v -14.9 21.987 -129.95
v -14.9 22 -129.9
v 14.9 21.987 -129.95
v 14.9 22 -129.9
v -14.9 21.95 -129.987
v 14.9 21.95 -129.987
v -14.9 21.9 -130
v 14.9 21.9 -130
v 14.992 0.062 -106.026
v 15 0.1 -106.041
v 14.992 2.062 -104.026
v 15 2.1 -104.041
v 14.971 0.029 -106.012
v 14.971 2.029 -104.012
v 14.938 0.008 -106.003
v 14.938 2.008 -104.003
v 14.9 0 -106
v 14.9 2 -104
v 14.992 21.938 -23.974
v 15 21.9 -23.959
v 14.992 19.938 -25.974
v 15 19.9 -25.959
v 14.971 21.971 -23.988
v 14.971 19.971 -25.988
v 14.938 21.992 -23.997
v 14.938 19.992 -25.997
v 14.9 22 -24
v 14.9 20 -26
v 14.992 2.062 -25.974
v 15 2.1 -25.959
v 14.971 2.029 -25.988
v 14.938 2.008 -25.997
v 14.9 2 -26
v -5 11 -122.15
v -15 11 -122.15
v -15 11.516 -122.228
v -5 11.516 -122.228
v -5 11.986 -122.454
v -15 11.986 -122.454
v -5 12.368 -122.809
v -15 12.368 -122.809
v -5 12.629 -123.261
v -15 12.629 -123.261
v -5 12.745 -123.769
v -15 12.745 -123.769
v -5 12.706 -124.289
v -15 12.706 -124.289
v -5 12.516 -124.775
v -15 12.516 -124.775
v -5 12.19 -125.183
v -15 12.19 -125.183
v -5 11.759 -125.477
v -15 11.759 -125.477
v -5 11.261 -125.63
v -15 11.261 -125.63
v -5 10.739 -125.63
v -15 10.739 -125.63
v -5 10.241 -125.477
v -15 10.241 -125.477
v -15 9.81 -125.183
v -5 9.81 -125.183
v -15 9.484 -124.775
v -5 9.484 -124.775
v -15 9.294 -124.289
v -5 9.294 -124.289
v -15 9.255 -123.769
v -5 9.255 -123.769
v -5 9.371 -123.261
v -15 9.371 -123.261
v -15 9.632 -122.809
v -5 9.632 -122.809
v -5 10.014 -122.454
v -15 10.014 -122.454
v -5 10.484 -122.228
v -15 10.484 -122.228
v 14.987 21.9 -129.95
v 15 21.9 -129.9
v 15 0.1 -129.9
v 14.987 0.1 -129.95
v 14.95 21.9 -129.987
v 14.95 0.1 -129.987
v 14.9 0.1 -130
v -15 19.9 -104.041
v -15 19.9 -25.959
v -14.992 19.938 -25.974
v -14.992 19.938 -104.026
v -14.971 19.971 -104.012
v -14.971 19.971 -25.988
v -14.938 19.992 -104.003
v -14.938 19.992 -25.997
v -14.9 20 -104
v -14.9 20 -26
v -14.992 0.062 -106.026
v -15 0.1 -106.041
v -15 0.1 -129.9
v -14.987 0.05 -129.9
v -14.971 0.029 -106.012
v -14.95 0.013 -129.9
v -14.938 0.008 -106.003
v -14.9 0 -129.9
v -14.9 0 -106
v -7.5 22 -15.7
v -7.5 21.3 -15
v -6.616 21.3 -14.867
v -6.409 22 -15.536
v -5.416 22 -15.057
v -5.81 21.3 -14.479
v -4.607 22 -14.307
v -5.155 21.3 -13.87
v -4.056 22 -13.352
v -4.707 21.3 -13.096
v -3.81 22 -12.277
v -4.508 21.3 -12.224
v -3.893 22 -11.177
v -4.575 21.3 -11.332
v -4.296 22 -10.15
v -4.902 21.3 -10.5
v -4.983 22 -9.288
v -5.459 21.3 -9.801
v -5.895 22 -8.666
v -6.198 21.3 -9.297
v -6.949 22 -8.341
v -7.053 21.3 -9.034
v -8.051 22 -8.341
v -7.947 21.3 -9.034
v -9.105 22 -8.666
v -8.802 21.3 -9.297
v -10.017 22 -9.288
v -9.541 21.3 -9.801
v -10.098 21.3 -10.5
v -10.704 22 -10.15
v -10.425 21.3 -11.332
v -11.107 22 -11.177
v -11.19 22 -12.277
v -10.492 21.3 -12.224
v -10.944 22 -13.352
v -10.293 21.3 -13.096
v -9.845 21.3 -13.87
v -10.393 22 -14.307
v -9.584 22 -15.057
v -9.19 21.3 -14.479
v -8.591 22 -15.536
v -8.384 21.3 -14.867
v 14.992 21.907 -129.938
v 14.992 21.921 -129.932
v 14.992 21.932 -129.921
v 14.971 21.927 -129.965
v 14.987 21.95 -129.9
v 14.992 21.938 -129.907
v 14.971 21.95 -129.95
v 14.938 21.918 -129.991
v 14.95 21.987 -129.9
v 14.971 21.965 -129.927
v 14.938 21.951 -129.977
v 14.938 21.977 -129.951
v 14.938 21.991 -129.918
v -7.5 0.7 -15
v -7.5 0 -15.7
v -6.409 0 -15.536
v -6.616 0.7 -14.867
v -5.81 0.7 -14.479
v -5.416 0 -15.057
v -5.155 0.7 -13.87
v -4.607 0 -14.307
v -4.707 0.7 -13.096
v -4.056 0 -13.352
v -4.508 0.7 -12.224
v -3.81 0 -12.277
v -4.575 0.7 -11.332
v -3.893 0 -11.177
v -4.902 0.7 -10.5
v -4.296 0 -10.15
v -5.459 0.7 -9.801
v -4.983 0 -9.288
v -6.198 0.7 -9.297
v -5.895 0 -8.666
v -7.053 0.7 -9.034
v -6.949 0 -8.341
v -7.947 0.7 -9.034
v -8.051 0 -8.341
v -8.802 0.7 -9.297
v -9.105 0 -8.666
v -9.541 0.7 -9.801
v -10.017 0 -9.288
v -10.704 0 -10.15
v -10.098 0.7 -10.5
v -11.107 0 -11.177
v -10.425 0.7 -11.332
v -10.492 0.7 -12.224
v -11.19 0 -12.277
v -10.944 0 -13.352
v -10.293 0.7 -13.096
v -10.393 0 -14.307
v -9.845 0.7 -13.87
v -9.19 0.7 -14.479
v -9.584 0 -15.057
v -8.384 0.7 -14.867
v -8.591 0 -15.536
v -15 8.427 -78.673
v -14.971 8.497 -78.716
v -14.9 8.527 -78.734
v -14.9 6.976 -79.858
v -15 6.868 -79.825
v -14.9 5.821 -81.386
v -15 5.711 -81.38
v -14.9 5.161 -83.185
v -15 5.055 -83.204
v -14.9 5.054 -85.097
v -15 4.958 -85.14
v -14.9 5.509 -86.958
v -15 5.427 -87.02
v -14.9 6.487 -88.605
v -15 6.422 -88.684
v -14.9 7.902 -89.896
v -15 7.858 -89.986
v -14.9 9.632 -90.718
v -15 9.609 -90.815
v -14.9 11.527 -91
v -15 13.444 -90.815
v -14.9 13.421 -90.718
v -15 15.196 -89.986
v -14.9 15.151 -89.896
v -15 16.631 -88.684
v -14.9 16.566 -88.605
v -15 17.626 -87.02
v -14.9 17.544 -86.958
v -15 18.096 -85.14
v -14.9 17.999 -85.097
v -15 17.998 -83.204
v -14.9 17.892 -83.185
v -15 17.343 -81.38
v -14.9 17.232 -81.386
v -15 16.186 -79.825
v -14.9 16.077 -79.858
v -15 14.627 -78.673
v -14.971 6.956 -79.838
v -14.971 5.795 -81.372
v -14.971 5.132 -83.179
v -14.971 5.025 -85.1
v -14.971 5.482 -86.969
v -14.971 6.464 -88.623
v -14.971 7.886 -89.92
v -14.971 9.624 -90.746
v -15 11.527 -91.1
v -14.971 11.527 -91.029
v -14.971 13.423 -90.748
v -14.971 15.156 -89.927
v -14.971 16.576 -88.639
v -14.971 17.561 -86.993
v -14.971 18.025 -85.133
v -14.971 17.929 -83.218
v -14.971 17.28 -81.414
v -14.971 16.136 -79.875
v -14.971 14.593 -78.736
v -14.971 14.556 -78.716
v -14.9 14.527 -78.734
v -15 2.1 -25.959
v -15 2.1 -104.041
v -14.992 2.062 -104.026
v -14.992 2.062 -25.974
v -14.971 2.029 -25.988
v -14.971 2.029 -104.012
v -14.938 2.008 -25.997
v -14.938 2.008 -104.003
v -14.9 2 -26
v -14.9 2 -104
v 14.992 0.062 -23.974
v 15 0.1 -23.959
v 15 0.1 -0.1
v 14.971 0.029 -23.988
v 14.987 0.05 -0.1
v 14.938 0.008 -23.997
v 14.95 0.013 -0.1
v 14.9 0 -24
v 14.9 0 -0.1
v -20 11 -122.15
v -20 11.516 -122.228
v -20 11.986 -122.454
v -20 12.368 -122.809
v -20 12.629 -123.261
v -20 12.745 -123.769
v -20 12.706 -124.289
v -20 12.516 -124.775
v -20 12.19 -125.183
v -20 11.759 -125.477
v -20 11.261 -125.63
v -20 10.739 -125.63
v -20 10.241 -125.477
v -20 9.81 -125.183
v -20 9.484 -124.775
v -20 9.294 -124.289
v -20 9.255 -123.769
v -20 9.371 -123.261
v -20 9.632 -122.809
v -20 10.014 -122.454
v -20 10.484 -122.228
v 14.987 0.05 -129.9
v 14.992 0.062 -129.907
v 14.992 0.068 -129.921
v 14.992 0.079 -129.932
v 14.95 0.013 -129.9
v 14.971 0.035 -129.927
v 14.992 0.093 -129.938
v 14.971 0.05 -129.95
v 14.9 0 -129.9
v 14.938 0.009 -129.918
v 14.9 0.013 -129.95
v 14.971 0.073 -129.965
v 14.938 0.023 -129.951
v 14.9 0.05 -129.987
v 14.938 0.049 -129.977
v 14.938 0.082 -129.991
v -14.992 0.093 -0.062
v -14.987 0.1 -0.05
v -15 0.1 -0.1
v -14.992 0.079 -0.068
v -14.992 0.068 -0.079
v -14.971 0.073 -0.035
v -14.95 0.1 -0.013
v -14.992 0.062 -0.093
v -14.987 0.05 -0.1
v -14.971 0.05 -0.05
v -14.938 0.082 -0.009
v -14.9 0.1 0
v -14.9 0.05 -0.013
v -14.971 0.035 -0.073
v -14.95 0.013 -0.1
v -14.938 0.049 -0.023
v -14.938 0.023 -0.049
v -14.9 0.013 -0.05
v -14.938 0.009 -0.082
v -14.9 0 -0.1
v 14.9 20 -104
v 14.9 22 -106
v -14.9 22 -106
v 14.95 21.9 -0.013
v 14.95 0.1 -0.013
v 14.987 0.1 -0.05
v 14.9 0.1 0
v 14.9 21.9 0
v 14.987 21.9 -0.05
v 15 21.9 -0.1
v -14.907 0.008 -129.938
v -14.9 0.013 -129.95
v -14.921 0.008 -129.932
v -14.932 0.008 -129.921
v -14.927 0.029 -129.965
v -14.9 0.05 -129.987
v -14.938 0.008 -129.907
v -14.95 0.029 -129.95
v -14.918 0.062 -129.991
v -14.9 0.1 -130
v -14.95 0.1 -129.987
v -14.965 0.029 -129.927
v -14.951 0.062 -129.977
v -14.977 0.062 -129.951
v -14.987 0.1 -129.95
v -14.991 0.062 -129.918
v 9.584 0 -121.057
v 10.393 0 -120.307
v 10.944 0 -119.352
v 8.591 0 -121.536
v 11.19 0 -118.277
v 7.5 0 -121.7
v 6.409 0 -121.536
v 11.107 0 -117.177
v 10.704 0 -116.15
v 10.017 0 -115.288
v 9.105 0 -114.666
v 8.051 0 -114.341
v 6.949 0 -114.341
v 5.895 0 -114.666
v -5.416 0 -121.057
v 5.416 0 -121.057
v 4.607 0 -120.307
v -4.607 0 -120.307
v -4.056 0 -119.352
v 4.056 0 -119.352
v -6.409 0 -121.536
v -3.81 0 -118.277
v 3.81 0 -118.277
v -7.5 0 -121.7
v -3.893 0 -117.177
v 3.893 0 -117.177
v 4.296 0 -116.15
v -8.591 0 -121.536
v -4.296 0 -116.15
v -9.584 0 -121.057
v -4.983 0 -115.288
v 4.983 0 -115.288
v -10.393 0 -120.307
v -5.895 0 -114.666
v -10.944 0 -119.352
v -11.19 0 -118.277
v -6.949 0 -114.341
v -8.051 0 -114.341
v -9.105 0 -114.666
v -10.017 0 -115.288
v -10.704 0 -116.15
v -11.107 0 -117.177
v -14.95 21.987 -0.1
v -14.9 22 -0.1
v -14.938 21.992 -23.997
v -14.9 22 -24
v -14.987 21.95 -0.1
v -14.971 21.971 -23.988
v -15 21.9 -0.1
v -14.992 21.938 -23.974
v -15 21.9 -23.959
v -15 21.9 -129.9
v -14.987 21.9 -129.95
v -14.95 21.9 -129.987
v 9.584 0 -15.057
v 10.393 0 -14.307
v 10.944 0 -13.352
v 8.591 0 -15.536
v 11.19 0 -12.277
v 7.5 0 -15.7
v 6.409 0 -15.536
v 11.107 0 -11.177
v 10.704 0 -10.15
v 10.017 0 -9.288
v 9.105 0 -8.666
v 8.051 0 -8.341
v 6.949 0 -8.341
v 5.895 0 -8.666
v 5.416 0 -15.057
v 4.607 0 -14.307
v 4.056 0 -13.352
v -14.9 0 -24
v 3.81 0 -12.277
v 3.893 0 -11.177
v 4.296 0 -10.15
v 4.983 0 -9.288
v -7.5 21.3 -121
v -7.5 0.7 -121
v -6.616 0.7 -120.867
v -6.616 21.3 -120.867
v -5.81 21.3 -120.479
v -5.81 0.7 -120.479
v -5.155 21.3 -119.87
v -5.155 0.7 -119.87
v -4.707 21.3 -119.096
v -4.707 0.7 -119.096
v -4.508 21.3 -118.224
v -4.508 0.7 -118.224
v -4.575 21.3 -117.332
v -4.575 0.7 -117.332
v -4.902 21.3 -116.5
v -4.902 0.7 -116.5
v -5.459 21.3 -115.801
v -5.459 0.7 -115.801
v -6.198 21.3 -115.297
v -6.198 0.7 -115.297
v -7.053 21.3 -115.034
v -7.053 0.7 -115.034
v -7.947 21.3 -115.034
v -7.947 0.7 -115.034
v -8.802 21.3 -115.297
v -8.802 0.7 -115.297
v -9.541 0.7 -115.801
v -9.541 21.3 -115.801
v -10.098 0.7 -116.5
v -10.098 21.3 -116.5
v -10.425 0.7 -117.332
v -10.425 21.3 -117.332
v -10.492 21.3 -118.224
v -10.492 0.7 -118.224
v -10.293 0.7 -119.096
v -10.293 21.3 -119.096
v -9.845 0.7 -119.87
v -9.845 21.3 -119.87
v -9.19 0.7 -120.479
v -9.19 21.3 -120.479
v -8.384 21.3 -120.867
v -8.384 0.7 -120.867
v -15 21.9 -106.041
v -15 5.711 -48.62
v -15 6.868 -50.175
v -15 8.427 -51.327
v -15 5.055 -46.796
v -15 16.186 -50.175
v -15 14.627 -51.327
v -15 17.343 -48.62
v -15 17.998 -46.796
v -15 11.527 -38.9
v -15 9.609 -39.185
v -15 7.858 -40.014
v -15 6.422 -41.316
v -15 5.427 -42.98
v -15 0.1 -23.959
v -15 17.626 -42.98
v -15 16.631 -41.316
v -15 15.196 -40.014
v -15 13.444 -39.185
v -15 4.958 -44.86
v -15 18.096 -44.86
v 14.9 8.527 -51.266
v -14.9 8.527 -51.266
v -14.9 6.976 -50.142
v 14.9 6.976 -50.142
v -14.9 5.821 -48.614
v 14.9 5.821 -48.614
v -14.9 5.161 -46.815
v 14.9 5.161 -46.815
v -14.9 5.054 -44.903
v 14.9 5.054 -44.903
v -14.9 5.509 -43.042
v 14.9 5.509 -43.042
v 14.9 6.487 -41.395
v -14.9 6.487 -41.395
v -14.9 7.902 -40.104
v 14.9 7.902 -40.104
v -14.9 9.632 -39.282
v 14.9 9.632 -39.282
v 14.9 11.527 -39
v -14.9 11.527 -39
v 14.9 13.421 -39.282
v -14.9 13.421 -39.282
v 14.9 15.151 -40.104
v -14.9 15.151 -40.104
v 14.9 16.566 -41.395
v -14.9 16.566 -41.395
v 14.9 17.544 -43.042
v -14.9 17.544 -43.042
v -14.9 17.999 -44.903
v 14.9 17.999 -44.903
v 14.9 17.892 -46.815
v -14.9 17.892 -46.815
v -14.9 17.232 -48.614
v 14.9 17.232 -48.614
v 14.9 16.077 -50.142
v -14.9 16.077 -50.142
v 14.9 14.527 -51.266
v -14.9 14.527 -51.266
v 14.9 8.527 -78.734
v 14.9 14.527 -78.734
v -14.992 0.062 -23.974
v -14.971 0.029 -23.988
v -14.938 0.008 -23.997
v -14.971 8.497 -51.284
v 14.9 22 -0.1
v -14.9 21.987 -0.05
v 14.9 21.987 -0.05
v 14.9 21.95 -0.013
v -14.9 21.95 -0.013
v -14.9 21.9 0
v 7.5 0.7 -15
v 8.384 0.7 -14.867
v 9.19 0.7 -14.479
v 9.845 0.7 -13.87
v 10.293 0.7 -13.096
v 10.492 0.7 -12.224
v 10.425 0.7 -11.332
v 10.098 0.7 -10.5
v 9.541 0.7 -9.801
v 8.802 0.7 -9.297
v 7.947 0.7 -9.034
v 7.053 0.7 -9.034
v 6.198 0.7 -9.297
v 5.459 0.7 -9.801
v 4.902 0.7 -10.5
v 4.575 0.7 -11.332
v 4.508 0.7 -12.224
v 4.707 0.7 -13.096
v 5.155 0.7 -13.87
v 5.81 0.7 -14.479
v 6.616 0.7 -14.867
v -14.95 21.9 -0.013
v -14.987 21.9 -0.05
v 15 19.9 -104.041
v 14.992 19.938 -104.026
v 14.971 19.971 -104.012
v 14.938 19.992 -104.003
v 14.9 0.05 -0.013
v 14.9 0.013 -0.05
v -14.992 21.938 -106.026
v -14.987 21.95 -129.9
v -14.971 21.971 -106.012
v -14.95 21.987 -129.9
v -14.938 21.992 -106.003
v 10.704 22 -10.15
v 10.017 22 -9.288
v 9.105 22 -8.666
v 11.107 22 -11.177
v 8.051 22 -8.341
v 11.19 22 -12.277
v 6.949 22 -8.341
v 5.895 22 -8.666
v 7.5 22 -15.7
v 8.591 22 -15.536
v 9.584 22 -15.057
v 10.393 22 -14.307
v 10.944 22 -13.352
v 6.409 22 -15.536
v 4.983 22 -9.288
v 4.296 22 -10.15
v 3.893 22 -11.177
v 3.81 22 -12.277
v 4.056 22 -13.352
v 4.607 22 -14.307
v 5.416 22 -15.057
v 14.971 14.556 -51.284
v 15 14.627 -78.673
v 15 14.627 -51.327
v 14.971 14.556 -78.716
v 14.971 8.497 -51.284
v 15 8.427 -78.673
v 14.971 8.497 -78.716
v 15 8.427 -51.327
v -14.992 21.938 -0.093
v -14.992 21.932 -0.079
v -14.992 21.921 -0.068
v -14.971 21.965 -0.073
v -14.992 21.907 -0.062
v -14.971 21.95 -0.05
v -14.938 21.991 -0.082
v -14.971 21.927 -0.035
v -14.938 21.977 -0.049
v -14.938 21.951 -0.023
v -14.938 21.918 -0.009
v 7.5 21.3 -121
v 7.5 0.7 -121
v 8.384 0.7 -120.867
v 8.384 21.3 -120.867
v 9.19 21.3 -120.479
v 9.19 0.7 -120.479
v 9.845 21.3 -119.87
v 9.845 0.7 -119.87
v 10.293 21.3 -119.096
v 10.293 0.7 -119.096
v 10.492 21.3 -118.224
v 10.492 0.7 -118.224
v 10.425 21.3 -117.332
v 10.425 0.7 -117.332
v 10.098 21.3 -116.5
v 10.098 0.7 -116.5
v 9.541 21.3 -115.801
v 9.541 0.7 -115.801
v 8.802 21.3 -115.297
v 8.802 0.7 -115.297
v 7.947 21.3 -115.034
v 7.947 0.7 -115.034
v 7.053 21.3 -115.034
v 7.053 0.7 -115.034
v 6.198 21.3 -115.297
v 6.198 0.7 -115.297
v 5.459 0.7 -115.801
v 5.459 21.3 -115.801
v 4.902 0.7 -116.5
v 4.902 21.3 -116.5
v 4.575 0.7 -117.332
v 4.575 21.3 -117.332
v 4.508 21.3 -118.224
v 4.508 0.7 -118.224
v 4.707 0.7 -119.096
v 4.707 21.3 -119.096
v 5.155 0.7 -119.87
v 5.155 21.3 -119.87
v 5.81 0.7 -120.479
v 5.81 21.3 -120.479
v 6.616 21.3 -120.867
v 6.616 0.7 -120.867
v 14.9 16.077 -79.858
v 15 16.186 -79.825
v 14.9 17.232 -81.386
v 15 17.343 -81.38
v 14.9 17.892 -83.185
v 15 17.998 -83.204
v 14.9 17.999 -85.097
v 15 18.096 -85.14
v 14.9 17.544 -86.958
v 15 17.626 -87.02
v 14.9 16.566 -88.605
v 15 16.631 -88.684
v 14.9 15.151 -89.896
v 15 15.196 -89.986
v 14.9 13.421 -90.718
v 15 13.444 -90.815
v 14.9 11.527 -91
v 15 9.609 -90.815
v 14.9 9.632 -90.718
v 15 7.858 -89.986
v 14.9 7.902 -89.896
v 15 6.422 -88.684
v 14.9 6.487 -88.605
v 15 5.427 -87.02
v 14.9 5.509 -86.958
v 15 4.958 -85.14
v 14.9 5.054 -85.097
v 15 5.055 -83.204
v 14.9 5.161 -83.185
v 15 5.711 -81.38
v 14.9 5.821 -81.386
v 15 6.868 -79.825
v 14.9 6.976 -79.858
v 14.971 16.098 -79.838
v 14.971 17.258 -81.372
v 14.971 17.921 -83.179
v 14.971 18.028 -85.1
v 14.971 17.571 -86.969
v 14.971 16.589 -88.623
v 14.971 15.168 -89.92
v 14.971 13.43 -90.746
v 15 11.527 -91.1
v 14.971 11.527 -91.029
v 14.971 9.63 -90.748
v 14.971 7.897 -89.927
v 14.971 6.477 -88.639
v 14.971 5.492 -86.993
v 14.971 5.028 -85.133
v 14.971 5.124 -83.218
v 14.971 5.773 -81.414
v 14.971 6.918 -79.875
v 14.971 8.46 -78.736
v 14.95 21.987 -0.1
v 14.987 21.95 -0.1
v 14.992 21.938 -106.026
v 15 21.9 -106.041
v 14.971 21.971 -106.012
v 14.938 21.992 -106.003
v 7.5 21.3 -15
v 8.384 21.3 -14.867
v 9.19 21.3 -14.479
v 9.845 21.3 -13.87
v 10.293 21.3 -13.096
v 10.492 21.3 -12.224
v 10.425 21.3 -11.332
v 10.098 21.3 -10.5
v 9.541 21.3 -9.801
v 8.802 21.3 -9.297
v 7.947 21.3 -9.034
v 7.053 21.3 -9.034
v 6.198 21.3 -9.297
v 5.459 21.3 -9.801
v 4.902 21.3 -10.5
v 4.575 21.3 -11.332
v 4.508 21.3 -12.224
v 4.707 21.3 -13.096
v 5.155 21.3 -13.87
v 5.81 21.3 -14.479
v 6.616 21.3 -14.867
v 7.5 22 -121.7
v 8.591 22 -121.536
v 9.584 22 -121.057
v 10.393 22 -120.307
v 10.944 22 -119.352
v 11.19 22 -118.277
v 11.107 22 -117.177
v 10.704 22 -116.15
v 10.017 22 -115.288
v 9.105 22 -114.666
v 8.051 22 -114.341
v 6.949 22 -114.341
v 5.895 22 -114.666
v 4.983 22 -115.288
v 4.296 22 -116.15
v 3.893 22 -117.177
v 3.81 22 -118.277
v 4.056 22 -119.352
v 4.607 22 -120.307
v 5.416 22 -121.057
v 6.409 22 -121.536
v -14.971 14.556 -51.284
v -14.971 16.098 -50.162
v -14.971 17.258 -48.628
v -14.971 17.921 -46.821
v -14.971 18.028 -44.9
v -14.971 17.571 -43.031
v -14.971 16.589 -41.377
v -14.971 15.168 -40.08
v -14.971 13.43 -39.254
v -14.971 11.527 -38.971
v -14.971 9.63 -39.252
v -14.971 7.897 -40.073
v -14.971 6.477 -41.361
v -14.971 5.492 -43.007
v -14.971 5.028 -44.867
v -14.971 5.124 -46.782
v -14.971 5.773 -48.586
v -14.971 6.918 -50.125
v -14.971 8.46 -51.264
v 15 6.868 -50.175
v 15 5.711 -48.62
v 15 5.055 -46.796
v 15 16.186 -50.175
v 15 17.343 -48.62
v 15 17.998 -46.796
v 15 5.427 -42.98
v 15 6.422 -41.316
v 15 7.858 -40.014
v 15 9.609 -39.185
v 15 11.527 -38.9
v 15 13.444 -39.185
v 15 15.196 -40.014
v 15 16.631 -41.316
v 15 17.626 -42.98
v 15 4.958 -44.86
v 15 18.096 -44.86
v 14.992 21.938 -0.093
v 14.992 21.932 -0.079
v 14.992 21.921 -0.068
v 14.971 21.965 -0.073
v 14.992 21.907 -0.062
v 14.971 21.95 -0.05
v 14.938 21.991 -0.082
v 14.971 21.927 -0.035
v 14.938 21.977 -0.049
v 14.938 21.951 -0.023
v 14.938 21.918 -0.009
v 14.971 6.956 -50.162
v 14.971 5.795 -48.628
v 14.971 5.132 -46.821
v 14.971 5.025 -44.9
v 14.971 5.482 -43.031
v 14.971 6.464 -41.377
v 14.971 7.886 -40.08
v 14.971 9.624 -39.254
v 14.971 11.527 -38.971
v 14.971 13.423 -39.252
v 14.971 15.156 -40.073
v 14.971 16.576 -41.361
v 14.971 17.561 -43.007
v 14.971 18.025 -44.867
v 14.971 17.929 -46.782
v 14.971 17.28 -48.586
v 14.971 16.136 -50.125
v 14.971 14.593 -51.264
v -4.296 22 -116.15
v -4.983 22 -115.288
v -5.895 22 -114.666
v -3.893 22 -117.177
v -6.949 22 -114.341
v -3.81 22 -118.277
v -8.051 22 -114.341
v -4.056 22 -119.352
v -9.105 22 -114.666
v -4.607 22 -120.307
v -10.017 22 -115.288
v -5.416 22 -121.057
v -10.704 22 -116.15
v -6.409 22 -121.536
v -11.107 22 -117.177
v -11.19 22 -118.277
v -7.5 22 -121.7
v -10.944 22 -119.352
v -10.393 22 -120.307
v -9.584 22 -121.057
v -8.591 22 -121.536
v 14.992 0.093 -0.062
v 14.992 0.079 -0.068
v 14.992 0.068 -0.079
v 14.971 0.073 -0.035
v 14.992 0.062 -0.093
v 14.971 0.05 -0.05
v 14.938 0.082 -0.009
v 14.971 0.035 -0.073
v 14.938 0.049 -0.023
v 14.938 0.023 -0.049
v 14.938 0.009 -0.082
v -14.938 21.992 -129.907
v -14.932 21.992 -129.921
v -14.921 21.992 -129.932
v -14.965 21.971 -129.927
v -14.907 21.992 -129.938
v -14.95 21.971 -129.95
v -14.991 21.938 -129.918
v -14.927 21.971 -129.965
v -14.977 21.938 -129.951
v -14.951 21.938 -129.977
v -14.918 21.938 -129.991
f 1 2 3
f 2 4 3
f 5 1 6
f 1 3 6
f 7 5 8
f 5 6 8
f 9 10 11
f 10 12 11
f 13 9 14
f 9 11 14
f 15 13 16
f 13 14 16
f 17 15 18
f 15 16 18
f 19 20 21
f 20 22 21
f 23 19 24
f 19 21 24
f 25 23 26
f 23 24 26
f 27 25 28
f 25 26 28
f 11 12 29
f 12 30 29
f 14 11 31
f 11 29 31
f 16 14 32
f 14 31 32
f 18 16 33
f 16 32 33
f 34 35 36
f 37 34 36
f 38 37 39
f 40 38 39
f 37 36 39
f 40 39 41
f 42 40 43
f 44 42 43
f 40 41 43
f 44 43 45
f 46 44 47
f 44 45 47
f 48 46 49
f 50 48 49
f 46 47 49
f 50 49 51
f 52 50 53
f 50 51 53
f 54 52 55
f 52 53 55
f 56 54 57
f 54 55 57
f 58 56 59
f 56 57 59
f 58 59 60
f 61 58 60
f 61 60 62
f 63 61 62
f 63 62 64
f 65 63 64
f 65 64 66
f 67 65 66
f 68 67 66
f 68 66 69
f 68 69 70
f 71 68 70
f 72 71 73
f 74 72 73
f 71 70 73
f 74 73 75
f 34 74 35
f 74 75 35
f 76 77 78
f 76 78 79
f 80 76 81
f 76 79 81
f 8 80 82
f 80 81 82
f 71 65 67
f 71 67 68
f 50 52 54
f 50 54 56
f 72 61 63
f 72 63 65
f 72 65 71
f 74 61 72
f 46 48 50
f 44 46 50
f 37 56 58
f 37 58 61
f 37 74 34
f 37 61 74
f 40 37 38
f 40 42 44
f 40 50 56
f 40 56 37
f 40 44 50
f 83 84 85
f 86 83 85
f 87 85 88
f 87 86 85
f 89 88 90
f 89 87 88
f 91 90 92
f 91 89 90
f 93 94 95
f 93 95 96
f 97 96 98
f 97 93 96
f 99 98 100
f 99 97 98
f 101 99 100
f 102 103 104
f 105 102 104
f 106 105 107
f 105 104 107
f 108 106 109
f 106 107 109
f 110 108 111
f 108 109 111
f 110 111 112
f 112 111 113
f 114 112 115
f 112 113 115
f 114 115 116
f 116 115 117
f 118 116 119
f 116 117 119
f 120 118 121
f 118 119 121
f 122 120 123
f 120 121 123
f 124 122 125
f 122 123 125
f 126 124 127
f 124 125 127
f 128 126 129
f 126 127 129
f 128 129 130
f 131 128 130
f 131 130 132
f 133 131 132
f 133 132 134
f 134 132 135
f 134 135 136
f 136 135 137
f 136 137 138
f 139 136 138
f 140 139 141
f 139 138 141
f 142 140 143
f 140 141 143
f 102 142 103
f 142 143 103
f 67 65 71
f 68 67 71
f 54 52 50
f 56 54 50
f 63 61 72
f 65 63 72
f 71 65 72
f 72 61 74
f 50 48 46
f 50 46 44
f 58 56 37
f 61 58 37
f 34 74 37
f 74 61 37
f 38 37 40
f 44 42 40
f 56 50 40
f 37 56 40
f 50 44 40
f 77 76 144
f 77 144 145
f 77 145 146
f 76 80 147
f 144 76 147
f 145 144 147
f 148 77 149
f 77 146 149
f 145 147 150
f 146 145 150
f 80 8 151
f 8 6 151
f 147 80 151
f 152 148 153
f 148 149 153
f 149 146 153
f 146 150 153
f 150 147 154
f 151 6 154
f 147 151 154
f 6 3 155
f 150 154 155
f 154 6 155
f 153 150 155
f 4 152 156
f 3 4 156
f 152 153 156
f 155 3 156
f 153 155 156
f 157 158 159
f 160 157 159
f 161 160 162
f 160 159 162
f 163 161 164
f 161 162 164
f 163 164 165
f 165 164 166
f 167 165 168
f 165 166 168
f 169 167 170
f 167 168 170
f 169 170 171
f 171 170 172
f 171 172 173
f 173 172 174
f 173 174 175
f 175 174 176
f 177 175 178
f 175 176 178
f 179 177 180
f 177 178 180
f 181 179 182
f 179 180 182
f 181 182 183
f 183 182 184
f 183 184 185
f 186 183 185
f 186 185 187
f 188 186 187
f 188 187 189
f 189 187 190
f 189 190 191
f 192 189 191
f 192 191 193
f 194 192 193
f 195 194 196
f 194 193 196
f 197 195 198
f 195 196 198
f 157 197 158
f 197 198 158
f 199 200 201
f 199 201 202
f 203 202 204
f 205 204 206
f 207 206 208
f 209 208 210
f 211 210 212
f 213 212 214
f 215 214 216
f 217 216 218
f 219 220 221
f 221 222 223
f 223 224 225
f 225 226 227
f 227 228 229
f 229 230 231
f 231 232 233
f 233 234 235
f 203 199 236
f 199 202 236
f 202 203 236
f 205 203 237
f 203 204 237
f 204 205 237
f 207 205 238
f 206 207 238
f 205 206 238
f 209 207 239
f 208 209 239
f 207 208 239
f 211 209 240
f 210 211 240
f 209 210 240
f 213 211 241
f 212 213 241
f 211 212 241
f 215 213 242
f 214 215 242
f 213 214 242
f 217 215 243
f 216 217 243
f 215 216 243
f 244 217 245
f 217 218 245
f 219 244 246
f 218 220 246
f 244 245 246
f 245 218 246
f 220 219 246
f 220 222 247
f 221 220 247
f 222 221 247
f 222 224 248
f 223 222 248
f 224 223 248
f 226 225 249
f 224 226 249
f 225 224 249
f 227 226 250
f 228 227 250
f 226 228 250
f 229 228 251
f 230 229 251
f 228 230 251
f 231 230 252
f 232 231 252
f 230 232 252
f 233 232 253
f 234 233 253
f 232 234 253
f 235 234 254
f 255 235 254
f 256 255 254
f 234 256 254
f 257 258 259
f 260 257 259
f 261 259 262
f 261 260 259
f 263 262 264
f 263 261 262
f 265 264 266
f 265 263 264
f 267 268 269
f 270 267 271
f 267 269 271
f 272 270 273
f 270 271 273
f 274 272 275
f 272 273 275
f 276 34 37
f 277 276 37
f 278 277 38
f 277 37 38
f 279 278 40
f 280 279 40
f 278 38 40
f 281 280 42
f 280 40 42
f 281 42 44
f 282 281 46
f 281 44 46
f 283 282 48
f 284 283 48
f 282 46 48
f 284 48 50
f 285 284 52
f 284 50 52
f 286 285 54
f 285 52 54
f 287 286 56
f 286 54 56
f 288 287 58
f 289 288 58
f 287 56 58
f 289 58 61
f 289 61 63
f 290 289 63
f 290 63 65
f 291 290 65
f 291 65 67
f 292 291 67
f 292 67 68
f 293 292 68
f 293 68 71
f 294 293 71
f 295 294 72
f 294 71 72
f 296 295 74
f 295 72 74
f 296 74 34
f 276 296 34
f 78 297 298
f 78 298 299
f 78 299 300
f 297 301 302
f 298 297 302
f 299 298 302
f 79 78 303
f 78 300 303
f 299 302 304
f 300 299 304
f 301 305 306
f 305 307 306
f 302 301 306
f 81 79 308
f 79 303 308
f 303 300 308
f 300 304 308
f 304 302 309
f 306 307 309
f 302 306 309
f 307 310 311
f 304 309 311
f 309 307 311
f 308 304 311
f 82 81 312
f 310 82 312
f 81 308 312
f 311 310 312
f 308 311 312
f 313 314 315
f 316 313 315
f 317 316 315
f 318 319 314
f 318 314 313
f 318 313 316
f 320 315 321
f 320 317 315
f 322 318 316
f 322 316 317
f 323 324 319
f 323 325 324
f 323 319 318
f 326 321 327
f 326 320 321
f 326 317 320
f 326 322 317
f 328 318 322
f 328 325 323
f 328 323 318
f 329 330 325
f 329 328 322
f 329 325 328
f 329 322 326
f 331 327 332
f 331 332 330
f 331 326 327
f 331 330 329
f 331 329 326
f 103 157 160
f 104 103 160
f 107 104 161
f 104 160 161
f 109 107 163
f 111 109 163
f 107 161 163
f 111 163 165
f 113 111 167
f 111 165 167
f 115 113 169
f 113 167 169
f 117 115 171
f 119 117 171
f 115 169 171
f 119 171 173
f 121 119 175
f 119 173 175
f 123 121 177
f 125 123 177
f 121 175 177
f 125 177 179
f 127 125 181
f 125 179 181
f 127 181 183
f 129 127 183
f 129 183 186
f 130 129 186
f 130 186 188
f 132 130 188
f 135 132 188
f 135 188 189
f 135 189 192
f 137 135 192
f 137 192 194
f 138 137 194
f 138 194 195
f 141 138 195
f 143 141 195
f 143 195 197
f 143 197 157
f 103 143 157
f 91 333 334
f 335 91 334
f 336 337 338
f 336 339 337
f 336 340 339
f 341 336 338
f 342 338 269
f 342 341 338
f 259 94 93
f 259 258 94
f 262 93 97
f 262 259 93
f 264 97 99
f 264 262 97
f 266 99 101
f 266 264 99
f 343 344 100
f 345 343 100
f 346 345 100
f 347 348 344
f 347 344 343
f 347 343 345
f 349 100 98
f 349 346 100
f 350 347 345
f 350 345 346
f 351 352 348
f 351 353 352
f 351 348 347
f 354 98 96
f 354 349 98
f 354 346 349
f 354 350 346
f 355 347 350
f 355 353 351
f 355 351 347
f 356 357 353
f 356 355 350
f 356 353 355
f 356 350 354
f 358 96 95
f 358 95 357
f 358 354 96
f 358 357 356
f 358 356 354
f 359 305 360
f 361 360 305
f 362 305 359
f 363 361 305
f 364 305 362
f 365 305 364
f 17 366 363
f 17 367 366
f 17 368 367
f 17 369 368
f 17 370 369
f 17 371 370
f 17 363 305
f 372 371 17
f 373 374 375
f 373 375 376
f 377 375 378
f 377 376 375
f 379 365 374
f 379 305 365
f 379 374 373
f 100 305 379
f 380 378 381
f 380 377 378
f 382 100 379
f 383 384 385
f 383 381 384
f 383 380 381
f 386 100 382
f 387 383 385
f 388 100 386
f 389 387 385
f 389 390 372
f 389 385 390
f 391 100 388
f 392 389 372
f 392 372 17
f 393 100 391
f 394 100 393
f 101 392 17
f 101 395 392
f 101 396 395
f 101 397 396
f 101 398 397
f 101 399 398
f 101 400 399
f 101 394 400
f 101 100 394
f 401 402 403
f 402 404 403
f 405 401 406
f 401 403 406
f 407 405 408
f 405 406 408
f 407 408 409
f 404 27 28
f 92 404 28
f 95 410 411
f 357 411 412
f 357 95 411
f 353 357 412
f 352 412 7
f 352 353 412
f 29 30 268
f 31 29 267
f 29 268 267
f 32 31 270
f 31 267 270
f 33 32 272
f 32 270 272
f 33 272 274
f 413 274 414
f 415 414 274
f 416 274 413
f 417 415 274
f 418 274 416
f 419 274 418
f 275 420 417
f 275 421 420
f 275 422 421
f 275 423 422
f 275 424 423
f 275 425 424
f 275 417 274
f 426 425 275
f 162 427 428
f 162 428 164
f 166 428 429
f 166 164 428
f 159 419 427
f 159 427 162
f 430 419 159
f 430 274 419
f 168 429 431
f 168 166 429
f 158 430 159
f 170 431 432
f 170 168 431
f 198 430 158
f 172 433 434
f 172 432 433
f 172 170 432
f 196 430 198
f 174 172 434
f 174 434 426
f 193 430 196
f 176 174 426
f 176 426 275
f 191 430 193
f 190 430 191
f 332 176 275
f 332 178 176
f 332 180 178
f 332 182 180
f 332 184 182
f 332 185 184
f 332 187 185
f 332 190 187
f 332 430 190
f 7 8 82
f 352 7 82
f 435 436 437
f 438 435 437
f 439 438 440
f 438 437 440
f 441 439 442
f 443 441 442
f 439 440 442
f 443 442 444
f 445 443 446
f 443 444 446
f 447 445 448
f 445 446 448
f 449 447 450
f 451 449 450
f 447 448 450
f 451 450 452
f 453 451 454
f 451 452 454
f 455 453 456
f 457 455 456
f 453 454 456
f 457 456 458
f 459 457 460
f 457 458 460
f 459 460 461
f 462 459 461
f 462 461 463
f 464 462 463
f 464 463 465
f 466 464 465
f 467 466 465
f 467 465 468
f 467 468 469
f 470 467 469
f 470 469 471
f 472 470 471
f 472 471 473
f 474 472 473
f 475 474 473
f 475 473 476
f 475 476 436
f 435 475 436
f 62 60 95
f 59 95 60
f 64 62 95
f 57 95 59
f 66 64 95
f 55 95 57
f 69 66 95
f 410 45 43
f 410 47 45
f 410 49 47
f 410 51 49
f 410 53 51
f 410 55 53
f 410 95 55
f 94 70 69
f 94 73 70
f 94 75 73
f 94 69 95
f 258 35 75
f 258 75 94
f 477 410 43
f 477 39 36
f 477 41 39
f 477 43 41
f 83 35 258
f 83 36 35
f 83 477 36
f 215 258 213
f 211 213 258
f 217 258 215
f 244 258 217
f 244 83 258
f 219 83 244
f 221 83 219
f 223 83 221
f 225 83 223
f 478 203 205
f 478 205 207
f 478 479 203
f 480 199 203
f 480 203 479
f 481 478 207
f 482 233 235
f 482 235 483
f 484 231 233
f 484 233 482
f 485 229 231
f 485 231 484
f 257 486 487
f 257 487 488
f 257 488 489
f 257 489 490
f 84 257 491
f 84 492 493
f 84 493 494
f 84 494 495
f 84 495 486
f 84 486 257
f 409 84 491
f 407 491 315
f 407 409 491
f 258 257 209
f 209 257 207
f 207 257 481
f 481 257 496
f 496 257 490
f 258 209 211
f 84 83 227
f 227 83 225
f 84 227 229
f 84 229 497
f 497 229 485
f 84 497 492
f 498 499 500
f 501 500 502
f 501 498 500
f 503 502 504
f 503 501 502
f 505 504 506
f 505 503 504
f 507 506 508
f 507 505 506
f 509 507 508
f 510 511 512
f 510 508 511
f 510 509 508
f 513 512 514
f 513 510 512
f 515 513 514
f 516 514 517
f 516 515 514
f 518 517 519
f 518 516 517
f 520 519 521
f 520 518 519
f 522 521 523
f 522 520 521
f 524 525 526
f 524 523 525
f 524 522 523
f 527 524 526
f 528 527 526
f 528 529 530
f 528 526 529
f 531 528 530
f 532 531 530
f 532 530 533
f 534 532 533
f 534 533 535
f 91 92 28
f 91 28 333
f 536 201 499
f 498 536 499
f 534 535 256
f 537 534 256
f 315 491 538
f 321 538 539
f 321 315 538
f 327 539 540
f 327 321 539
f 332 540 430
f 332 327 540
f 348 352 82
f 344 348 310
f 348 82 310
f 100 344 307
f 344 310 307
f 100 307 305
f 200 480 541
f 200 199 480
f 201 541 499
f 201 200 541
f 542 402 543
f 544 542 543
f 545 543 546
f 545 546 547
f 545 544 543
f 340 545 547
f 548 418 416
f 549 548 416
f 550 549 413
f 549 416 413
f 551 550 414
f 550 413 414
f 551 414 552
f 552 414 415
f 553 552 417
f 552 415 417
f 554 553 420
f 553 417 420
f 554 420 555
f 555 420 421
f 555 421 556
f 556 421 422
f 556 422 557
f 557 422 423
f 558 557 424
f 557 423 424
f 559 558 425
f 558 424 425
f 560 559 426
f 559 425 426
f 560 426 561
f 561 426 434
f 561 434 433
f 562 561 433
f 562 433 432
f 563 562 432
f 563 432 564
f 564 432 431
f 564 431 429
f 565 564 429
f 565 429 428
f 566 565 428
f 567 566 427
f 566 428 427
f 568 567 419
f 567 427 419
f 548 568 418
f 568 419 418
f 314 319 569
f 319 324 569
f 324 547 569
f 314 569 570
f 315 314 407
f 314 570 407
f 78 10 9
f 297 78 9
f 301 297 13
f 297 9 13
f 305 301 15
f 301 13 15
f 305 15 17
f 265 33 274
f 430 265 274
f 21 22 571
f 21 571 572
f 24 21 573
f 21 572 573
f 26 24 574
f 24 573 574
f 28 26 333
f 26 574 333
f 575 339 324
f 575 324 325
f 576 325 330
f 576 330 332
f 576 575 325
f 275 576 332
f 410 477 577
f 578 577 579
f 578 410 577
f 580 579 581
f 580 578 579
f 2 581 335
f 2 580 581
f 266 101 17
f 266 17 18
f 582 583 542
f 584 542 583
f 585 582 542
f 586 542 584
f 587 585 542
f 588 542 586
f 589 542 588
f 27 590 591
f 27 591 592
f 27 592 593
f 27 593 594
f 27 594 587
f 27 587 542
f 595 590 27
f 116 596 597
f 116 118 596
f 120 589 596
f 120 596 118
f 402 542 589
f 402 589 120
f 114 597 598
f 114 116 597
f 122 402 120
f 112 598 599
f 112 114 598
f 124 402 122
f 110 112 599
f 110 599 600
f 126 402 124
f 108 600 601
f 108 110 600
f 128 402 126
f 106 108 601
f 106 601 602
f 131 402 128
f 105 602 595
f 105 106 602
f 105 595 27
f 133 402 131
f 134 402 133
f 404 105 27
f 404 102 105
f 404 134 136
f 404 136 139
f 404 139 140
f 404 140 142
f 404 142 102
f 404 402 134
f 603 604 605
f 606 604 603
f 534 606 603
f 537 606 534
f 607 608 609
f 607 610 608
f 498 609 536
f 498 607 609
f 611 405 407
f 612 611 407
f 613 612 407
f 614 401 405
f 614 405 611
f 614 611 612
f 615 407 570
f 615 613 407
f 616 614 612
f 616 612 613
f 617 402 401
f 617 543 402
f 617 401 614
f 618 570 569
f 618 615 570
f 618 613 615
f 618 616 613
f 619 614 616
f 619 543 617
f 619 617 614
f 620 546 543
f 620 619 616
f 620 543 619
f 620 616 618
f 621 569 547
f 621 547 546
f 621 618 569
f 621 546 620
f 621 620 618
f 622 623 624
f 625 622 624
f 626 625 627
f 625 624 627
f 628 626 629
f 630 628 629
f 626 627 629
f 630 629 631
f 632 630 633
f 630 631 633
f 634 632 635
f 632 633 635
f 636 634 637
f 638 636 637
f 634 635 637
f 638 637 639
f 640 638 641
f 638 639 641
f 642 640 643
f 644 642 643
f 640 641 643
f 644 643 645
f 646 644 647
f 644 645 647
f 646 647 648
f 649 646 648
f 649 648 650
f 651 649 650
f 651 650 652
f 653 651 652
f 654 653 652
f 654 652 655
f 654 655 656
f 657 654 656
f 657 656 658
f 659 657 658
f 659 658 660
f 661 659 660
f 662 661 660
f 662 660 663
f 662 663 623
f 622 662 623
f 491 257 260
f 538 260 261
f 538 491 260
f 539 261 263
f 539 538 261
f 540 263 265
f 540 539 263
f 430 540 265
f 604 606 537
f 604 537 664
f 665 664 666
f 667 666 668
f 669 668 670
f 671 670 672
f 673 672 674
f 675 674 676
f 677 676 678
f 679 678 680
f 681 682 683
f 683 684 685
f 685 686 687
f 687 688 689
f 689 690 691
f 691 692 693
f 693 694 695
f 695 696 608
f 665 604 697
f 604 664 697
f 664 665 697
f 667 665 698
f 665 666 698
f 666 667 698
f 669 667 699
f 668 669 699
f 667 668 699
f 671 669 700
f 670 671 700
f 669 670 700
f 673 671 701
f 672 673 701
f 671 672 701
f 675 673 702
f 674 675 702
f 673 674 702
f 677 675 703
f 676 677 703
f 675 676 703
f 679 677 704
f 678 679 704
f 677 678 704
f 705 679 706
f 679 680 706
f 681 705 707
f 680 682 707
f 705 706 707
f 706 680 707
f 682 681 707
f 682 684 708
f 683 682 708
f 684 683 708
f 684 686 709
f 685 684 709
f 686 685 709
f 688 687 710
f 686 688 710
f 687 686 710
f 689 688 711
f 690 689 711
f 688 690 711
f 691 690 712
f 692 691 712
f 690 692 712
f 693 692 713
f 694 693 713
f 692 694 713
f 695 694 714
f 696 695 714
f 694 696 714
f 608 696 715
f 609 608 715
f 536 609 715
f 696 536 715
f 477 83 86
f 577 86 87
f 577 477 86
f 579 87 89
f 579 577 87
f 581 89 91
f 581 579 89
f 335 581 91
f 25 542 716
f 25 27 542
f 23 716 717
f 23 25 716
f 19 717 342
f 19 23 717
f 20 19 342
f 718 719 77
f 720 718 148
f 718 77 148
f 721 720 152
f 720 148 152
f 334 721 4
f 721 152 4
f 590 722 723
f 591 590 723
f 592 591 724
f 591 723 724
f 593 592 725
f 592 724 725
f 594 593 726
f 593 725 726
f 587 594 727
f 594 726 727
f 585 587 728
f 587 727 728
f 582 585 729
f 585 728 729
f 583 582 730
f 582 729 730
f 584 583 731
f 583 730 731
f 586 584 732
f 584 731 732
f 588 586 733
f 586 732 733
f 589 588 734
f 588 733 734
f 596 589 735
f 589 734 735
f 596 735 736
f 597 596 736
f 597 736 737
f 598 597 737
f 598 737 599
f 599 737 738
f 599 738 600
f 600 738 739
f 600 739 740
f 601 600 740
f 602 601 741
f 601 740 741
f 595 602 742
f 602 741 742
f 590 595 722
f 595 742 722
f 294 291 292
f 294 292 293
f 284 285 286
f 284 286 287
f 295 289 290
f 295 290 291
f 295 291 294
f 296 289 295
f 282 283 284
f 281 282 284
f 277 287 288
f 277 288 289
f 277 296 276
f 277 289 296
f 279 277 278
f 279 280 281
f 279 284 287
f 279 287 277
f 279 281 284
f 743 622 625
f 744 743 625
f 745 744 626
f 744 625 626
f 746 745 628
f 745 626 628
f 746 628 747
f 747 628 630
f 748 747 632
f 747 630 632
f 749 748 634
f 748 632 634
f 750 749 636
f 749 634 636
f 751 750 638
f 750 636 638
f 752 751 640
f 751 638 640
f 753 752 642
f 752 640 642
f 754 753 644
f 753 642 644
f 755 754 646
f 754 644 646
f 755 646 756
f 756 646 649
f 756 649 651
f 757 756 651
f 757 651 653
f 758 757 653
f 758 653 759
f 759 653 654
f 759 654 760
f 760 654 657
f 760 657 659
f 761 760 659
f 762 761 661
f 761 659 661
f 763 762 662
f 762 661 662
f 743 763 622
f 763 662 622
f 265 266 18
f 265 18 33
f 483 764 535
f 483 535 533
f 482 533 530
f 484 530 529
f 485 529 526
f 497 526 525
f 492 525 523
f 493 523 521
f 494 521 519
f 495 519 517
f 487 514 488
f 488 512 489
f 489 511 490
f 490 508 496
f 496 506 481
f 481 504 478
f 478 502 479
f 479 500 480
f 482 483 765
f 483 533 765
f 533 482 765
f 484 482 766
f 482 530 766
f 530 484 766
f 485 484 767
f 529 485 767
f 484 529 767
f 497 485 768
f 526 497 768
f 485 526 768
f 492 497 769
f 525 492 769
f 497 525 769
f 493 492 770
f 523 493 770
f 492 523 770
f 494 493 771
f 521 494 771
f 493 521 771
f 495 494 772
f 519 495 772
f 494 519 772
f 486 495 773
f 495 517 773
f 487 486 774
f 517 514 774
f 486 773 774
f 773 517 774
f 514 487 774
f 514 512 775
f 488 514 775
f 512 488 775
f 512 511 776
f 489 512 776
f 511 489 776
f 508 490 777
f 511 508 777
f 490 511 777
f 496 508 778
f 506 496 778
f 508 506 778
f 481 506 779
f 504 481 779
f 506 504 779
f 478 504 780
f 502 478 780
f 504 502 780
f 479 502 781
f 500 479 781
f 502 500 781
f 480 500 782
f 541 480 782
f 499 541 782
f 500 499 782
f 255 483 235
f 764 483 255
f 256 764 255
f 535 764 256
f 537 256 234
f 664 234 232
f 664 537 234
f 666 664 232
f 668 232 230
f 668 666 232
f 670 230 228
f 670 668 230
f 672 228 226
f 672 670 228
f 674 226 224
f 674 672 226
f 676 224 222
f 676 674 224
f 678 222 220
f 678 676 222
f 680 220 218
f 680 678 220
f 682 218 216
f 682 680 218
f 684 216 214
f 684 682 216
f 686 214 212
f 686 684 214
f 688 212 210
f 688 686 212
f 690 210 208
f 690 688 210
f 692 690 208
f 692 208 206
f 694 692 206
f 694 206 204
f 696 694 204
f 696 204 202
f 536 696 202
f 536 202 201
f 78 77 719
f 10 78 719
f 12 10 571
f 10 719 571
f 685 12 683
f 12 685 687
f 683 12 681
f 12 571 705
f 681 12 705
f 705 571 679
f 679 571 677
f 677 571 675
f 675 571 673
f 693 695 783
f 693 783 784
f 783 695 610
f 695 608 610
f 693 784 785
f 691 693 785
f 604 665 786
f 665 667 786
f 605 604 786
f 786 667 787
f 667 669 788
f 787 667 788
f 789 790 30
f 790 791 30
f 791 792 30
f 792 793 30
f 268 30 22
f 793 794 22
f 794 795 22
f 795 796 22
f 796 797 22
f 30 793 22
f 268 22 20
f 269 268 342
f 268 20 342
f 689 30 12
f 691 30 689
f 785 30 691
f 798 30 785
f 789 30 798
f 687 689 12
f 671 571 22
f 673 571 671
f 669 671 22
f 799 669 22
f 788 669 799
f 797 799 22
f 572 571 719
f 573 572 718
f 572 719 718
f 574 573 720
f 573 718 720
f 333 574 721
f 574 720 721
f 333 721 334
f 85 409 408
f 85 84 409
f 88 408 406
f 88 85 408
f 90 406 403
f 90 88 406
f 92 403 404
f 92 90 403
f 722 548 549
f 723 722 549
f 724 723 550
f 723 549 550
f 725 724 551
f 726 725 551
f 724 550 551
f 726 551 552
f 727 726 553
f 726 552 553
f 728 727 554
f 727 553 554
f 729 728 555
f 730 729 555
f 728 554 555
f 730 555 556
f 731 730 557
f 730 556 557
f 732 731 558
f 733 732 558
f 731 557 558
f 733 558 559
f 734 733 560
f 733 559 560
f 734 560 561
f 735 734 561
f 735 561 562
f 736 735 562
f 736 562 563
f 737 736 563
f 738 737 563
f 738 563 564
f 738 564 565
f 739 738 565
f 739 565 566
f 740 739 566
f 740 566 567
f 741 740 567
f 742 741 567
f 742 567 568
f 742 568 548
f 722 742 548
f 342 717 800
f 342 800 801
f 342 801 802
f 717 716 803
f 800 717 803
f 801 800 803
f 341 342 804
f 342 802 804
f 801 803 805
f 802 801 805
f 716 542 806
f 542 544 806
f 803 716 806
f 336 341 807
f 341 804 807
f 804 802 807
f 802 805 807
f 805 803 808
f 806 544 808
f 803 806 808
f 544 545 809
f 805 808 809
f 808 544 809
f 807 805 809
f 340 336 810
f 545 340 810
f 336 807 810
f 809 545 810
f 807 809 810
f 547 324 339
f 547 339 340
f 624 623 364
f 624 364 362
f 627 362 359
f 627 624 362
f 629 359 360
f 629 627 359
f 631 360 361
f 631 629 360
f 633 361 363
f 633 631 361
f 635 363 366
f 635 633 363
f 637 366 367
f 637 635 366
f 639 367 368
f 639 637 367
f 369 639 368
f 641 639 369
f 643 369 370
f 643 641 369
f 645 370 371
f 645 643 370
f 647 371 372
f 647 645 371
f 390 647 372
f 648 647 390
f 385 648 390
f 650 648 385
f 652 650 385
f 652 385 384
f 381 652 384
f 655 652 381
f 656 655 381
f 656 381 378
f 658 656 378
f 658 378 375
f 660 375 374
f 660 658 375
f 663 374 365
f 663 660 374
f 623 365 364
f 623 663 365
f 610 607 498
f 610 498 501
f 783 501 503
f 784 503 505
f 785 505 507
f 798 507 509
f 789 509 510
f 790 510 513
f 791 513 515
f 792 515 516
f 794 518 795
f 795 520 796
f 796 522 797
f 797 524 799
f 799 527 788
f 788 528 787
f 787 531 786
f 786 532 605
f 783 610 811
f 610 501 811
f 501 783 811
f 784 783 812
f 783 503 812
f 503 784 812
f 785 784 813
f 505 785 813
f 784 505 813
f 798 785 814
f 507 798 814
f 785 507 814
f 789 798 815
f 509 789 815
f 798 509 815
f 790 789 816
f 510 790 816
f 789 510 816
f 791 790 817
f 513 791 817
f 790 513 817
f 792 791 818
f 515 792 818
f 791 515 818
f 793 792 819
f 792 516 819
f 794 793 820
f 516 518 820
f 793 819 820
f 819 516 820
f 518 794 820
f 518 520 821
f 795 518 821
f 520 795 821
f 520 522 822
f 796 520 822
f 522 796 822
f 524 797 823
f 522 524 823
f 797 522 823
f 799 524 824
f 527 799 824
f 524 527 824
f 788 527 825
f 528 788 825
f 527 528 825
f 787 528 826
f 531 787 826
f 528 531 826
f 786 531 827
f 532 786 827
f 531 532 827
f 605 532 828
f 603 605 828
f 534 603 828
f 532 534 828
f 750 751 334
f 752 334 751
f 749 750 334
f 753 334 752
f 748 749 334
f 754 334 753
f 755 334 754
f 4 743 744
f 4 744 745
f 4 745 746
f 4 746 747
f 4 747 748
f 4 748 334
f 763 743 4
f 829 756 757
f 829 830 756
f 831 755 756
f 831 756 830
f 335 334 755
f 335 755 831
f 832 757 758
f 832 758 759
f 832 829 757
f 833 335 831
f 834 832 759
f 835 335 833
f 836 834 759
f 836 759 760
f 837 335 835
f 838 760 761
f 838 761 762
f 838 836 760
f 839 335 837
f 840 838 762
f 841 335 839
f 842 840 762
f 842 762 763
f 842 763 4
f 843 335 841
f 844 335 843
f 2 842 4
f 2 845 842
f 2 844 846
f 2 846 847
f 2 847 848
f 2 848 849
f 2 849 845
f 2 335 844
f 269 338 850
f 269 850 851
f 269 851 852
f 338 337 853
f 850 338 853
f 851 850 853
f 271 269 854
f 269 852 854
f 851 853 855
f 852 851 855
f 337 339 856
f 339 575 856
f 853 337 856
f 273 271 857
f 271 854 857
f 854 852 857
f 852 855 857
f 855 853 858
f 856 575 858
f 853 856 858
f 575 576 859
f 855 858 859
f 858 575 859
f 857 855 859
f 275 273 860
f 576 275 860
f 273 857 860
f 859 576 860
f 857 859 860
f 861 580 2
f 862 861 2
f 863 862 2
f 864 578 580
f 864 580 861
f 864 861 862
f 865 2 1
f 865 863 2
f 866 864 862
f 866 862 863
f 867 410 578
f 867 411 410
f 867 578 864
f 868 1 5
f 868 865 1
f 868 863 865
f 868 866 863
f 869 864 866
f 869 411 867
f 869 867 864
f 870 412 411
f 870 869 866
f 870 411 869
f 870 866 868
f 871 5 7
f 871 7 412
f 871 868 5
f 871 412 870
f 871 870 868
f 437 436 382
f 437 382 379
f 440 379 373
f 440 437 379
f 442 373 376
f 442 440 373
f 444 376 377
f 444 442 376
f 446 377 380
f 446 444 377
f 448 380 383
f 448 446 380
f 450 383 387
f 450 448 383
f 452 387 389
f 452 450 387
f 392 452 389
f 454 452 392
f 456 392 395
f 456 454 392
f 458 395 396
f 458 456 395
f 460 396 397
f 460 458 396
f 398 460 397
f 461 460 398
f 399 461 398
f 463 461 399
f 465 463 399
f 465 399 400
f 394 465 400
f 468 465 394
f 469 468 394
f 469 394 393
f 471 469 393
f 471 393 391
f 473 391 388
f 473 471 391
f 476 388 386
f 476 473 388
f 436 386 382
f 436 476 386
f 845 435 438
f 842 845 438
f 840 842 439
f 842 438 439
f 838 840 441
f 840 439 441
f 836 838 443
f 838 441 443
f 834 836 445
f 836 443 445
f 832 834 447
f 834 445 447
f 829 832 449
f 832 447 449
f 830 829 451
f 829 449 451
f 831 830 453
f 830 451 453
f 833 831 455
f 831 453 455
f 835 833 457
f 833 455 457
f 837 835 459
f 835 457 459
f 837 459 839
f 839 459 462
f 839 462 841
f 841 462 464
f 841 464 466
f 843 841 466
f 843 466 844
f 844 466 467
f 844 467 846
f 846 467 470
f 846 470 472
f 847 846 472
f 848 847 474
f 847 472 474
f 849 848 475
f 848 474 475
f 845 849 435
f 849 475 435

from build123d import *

# Parameters (mm, degrees)
EXTRUDE_1_DEPTH      = 15
EXTRUDE_1_DEPTH_BACK = 15
CUT_EXTRUDE_1_DEPTH  = 45
SKETCH_12_R          = 3
CUT_EXTRUDE_2_DEPTH  = 40
CHAMFER_1_SIZE       = 0.7
FILLET_1_R           = 0.1
SKETCH_13_R          = 1.75
CUT_EXTRUDE_3_DEPTH  = 10
SKETCH_15_R          = 1.75
EXTRUDE_2_DEPTH      = 15


with BuildPart() as part:
    # Эскиз1 → Бобышка-Вытянуть1 (new, two sides: drawn at the far end of the back side and taken through both)
    with BuildSketch(Plane(origin=(0, 0, 0), x_dir=(0, 0, -1), z_dir=(1, 0, 0)).offset(-EXTRUDE_1_DEPTH_BACK)):
        Polygon((24, 22), (26, 20), (104, 20), (106, 22), (130, 22), (130, 0), (106, 0), (104, 2), (26, 2), (24, 0), (0, 0), (0, 22), align=None)
    extrude(amount=EXTRUDE_1_DEPTH + EXTRUDE_1_DEPTH_BACK)

    # Эскиз2 → Вырез-Вытянуть1 (cut)
    with BuildSketch(Plane(origin=(15, 0, 0), x_dir=(0, 0, -1), z_dir=(1, 0, 0))):
        with BuildLine():
            Line((51.266281297, 14.526622722), (78.733718703, 14.526622722))
            ThreePointArc((78.733718703, 14.526622722), (91, 11.526622722), (78.733718703, 8.526622722))
            Line((78.733718703, 8.526622722), (51.266281297, 8.526622722))
            ThreePointArc((51.266281297, 8.526622722), (39, 11.526622722), (51.266281297, 14.526622722))
        make_face()
    extrude(amount=-CUT_EXTRUDE_1_DEPTH, mode=Mode.SUBTRACT)

    # Эскиз12 → Вырез-Вытянуть2 (cut)
    with BuildSketch(Plane.XZ):
        with Locations((7.5, -118)):
            Circle(SKETCH_12_R)
        with Locations((-7.5, -118)):
            Circle(SKETCH_12_R)
        with Locations((7.5, -12)):
            Circle(SKETCH_12_R)
        with Locations((-7.5, -12)):
            Circle(SKETCH_12_R)
    extrude(amount=-CUT_EXTRUDE_2_DEPTH, mode=Mode.SUBTRACT)

    # Фаска1
    chamfer_1_edges = [part.edges().sort_by_distance(p)[0] for p in [
        (-10.5, 0, -118),
        (-10.5, 22, -118),
        (4.5, 0, -118),
        (4.5, 22, -118),
        (4.5, 0, -12),
        (4.5, 22, -12),
        (-10.5, 0, -12),
        (-10.5, 22, -12),
    ]]
    chamfer(chamfer_1_edges, length=CHAMFER_1_SIZE)

    # Скругление1
    fillet_1_edges = [part.edges().sort_by_distance(p)[0] for p in [
        (-15, 0, -118),
        (-15, 22, -118),
        (-15, 21, -105),
        (-15, 20, -65),
        (-15, 21, -25),
        (-15, 22, -12),
        (-15, 0, -12),
        (-15, 1, -25),
        (-15, 2, -65),
        (-15, 1, -105),
        (-15, 11.526622722, -39),
        (-15, 14.526622722, -65),
        (-15, 11.526622722, -91),
        (-15, 8.526622722, -65),
        (-15, 11, -130),
        (0, 0, -130),
        (0, 22, -130),
        (-15, 11, 0),
        (0, 22, 0),
        (0, 0, 0),
        (15, 2, -65),
        (15, 1, -25),
        (15, 0, -12),
        (15, 11, 0),
        (15, 22, -12),
        (15, 21, -25),
        (15, 20, -65),
        (15, 21, -105),
        (15, 22, -118),
        (15, 11, -130),
        (15, 0, -118),
        (15, 1, -105),
        (15, 14.526622722, -65),
        (15, 11.526622722, -39),
        (15, 8.526622722, -65),
        (15, 11.526622722, -91),
    ]]
    fillet(fillet_1_edges, radius=FILLET_1_R)

    # Эскиз13 → Вырез-Вытянуть3 (cut)
    with BuildSketch(Plane.ZY.offset(15)):
        with Locations((-123.9, 11)):
            Circle(SKETCH_13_R)
    extrude(amount=-CUT_EXTRUDE_3_DEPTH, mode=Mode.SUBTRACT)


with BuildPart() as body_2:
    # Эскиз15 → Бобышка-Вытянуть2 (new body)
    with BuildSketch(Plane.ZY.offset(5)):
        with Locations((-123.9, 11)):
            Circle(SKETCH_15_R)
    extrude(amount=EXTRUDE_2_DEPTH)


solid = Compound([part.part, body_2.part])
